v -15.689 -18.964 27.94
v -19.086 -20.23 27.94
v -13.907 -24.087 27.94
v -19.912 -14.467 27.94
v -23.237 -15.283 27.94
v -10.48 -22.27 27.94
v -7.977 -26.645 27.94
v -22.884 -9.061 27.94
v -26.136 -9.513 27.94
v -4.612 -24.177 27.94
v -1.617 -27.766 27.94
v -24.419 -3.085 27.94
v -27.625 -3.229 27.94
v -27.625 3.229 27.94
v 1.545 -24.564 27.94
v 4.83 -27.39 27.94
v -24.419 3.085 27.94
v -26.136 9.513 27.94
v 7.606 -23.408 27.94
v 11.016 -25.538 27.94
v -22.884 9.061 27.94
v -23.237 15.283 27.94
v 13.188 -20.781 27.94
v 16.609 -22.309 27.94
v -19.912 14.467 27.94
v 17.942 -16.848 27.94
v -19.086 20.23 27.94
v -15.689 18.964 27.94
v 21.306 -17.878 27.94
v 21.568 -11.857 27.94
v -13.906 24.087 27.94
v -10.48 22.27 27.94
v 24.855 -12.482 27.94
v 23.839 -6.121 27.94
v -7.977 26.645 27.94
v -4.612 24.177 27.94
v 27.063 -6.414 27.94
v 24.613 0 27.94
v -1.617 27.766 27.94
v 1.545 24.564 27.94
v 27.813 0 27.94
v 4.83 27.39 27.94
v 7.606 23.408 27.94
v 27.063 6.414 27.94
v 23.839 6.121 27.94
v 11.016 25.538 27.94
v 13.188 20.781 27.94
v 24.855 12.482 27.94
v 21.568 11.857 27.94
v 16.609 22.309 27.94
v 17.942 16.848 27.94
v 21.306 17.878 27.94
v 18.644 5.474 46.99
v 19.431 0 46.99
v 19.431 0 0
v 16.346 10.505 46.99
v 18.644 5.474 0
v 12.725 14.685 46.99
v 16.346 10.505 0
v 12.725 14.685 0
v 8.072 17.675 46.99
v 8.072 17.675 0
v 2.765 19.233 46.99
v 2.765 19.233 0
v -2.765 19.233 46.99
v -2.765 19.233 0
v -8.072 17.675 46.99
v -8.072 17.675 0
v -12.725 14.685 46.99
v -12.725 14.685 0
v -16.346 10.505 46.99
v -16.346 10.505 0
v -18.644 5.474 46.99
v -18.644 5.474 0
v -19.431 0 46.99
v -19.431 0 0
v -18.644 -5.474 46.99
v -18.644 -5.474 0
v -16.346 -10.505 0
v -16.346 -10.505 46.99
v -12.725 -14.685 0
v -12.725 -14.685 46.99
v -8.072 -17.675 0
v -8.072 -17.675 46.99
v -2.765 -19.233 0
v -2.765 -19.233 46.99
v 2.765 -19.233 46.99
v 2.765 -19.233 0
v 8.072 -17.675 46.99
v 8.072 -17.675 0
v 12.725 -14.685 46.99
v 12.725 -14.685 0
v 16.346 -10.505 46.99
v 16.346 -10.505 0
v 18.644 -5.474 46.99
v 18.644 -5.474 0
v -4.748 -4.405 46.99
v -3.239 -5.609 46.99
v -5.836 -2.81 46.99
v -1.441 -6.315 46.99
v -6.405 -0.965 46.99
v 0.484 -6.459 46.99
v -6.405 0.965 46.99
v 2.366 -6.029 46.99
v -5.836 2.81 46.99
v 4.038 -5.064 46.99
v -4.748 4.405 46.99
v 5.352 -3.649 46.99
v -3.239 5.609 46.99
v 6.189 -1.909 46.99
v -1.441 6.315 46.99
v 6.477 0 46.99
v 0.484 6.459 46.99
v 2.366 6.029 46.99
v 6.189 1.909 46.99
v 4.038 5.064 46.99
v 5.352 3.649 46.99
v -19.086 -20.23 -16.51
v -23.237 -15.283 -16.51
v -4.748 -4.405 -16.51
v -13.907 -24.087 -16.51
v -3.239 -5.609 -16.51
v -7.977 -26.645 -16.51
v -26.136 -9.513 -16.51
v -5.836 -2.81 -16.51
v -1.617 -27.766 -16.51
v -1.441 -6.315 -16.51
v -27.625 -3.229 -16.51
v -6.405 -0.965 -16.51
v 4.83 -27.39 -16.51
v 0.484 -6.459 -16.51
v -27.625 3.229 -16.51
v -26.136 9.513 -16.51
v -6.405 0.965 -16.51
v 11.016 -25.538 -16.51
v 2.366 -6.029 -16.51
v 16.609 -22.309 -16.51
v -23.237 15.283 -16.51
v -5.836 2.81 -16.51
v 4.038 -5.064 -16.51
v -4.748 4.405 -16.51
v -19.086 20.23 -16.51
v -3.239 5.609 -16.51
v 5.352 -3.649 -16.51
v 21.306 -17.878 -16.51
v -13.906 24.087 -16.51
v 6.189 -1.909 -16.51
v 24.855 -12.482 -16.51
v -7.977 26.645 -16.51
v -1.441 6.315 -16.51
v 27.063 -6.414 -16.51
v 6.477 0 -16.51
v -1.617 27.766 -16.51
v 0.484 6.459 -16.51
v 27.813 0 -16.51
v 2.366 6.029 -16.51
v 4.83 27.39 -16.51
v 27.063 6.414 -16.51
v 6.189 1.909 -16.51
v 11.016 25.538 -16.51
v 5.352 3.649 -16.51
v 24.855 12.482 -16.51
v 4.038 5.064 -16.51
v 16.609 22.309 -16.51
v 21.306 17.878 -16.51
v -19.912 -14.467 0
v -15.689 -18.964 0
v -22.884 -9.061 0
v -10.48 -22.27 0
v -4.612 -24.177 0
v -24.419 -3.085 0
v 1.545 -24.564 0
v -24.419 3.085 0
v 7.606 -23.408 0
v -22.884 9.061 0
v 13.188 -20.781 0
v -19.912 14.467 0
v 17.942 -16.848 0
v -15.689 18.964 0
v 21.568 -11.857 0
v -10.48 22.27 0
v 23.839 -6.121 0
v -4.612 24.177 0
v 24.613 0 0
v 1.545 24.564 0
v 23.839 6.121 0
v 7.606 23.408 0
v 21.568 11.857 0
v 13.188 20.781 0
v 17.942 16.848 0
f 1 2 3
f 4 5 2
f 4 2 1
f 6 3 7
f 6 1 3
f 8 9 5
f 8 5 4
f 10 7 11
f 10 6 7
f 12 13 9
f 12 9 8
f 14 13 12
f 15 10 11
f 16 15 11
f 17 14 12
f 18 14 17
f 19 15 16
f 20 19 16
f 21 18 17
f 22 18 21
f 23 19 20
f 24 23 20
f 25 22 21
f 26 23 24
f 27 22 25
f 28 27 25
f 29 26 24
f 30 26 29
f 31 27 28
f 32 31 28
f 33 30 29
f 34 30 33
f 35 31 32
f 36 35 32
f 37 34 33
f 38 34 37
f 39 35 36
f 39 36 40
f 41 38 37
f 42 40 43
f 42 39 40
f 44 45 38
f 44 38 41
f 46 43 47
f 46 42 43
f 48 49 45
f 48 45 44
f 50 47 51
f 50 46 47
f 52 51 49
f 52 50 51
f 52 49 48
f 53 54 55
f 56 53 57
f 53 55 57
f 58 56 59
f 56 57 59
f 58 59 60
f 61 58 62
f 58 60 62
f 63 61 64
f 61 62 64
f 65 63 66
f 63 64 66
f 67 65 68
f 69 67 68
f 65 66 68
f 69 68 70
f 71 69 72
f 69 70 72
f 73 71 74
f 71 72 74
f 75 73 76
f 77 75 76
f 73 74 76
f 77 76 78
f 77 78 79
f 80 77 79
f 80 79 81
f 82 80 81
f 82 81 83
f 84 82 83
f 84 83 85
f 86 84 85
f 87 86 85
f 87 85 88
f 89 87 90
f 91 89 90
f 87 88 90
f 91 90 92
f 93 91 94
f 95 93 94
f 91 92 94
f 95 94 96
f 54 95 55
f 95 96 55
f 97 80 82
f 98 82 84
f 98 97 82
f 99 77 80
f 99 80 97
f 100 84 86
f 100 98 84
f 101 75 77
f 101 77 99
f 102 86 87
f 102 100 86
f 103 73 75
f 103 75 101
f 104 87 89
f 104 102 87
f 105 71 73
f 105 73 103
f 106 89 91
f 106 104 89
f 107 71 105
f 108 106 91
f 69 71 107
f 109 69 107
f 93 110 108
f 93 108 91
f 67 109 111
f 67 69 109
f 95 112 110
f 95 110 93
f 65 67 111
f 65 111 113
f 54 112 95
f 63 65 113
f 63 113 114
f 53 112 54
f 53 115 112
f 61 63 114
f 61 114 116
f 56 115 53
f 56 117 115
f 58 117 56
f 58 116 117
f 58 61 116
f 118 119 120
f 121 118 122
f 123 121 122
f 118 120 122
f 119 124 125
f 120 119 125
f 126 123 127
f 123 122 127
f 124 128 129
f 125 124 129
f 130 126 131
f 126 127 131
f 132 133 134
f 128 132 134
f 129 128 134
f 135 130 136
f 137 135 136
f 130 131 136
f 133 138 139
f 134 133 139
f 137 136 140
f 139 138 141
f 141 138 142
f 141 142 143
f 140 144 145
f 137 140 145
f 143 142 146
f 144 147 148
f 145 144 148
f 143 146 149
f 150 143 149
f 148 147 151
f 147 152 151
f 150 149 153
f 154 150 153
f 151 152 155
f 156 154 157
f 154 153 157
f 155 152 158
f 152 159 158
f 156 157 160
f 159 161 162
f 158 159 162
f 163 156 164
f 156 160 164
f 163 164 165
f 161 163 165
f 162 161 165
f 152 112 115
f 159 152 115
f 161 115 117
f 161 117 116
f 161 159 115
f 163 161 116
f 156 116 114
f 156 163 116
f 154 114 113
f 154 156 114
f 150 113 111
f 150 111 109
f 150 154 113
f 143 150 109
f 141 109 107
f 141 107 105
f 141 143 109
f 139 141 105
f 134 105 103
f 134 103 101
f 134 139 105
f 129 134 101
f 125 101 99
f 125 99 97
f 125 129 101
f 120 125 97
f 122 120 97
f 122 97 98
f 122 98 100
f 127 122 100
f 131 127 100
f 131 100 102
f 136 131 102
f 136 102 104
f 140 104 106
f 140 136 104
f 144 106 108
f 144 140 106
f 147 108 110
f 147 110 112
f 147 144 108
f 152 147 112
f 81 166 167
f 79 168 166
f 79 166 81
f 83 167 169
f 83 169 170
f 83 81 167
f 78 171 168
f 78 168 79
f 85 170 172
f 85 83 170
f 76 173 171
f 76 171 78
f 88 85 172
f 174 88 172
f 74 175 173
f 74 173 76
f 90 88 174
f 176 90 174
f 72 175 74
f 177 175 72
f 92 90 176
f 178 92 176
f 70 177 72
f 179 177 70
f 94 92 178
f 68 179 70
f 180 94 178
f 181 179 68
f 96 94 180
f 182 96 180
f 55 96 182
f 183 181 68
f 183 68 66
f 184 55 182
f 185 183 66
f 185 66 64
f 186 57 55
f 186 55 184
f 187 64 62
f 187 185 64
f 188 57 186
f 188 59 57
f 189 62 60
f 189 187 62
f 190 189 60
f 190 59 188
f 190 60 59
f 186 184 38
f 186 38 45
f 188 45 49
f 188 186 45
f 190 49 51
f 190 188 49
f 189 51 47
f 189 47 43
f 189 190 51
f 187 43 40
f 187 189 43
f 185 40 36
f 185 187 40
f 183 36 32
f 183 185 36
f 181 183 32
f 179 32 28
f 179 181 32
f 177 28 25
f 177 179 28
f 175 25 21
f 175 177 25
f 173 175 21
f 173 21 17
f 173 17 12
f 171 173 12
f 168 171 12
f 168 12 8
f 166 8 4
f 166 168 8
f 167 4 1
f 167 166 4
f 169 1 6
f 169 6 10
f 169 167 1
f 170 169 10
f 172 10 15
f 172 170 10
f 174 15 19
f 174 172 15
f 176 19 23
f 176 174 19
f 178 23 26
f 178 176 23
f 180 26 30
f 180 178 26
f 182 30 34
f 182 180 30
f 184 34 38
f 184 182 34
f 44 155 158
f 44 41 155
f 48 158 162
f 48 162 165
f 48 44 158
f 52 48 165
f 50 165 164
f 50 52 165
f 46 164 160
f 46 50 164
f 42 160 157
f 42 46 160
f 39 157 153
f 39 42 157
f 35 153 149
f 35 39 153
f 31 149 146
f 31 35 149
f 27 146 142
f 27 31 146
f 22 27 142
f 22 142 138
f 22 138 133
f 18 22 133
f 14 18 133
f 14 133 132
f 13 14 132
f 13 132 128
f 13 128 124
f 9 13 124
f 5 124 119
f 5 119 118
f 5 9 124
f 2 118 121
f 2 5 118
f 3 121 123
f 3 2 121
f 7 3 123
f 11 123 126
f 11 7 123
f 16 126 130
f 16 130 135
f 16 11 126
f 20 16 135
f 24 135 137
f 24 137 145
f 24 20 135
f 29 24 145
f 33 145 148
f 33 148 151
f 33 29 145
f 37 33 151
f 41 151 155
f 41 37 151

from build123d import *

# Parameters (mm, degrees)
F0_R     = 27.813
F0_R_2   = 24.6126
F1_DEPTH = 27.94
F0_R_3   = 19.431
F0_R_4   = 6.477
F2_DEPTH = 16.51
F3_DEPTH = 19.05


with BuildPart() as f1:
    # F0 (on Top) → F1 (new body)
    with BuildSketch(Plane.XY):
        Circle(F0_R)
        Circle(F0_R_2, mode=Mode.SUBTRACT)
    extrude(amount=F1_DEPTH)



with BuildPart() as f1b:
    # F0 (on Top) → F1, piece 2 (new body)
    with BuildSketch(Plane.XY):
        Circle(F0_R_3)
        Circle(F0_R_4, mode=Mode.SUBTRACT)
    extrude(amount=F1_DEPTH)


with BuildPart() as f1_1:
    add(f1.part)

    add(f1b.part)  # F2 merges F1b
    # F0 (on Top) → F2 (join)
    with BuildSketch(Plane.XY):
        Circle(F0_R)
        Circle(F0_R_2, mode=Mode.SUBTRACT)
        Circle(F0_R_2)
        Circle(F0_R_3, mode=Mode.SUBTRACT)
        Circle(F0_R_3)
        Circle(F0_R_4, mode=Mode.SUBTRACT)
    extrude(amount=-F2_DEPTH)

    # F3 (add): a face of the model
    f3_faces = [f1_1.faces().sort_by_distance(p)[0] for p in [
        (-18.8814083254, 0, 27.94),
    ]]
    extrude(f3_faces, amount=F3_DEPTH)


solid = f1_1.part
